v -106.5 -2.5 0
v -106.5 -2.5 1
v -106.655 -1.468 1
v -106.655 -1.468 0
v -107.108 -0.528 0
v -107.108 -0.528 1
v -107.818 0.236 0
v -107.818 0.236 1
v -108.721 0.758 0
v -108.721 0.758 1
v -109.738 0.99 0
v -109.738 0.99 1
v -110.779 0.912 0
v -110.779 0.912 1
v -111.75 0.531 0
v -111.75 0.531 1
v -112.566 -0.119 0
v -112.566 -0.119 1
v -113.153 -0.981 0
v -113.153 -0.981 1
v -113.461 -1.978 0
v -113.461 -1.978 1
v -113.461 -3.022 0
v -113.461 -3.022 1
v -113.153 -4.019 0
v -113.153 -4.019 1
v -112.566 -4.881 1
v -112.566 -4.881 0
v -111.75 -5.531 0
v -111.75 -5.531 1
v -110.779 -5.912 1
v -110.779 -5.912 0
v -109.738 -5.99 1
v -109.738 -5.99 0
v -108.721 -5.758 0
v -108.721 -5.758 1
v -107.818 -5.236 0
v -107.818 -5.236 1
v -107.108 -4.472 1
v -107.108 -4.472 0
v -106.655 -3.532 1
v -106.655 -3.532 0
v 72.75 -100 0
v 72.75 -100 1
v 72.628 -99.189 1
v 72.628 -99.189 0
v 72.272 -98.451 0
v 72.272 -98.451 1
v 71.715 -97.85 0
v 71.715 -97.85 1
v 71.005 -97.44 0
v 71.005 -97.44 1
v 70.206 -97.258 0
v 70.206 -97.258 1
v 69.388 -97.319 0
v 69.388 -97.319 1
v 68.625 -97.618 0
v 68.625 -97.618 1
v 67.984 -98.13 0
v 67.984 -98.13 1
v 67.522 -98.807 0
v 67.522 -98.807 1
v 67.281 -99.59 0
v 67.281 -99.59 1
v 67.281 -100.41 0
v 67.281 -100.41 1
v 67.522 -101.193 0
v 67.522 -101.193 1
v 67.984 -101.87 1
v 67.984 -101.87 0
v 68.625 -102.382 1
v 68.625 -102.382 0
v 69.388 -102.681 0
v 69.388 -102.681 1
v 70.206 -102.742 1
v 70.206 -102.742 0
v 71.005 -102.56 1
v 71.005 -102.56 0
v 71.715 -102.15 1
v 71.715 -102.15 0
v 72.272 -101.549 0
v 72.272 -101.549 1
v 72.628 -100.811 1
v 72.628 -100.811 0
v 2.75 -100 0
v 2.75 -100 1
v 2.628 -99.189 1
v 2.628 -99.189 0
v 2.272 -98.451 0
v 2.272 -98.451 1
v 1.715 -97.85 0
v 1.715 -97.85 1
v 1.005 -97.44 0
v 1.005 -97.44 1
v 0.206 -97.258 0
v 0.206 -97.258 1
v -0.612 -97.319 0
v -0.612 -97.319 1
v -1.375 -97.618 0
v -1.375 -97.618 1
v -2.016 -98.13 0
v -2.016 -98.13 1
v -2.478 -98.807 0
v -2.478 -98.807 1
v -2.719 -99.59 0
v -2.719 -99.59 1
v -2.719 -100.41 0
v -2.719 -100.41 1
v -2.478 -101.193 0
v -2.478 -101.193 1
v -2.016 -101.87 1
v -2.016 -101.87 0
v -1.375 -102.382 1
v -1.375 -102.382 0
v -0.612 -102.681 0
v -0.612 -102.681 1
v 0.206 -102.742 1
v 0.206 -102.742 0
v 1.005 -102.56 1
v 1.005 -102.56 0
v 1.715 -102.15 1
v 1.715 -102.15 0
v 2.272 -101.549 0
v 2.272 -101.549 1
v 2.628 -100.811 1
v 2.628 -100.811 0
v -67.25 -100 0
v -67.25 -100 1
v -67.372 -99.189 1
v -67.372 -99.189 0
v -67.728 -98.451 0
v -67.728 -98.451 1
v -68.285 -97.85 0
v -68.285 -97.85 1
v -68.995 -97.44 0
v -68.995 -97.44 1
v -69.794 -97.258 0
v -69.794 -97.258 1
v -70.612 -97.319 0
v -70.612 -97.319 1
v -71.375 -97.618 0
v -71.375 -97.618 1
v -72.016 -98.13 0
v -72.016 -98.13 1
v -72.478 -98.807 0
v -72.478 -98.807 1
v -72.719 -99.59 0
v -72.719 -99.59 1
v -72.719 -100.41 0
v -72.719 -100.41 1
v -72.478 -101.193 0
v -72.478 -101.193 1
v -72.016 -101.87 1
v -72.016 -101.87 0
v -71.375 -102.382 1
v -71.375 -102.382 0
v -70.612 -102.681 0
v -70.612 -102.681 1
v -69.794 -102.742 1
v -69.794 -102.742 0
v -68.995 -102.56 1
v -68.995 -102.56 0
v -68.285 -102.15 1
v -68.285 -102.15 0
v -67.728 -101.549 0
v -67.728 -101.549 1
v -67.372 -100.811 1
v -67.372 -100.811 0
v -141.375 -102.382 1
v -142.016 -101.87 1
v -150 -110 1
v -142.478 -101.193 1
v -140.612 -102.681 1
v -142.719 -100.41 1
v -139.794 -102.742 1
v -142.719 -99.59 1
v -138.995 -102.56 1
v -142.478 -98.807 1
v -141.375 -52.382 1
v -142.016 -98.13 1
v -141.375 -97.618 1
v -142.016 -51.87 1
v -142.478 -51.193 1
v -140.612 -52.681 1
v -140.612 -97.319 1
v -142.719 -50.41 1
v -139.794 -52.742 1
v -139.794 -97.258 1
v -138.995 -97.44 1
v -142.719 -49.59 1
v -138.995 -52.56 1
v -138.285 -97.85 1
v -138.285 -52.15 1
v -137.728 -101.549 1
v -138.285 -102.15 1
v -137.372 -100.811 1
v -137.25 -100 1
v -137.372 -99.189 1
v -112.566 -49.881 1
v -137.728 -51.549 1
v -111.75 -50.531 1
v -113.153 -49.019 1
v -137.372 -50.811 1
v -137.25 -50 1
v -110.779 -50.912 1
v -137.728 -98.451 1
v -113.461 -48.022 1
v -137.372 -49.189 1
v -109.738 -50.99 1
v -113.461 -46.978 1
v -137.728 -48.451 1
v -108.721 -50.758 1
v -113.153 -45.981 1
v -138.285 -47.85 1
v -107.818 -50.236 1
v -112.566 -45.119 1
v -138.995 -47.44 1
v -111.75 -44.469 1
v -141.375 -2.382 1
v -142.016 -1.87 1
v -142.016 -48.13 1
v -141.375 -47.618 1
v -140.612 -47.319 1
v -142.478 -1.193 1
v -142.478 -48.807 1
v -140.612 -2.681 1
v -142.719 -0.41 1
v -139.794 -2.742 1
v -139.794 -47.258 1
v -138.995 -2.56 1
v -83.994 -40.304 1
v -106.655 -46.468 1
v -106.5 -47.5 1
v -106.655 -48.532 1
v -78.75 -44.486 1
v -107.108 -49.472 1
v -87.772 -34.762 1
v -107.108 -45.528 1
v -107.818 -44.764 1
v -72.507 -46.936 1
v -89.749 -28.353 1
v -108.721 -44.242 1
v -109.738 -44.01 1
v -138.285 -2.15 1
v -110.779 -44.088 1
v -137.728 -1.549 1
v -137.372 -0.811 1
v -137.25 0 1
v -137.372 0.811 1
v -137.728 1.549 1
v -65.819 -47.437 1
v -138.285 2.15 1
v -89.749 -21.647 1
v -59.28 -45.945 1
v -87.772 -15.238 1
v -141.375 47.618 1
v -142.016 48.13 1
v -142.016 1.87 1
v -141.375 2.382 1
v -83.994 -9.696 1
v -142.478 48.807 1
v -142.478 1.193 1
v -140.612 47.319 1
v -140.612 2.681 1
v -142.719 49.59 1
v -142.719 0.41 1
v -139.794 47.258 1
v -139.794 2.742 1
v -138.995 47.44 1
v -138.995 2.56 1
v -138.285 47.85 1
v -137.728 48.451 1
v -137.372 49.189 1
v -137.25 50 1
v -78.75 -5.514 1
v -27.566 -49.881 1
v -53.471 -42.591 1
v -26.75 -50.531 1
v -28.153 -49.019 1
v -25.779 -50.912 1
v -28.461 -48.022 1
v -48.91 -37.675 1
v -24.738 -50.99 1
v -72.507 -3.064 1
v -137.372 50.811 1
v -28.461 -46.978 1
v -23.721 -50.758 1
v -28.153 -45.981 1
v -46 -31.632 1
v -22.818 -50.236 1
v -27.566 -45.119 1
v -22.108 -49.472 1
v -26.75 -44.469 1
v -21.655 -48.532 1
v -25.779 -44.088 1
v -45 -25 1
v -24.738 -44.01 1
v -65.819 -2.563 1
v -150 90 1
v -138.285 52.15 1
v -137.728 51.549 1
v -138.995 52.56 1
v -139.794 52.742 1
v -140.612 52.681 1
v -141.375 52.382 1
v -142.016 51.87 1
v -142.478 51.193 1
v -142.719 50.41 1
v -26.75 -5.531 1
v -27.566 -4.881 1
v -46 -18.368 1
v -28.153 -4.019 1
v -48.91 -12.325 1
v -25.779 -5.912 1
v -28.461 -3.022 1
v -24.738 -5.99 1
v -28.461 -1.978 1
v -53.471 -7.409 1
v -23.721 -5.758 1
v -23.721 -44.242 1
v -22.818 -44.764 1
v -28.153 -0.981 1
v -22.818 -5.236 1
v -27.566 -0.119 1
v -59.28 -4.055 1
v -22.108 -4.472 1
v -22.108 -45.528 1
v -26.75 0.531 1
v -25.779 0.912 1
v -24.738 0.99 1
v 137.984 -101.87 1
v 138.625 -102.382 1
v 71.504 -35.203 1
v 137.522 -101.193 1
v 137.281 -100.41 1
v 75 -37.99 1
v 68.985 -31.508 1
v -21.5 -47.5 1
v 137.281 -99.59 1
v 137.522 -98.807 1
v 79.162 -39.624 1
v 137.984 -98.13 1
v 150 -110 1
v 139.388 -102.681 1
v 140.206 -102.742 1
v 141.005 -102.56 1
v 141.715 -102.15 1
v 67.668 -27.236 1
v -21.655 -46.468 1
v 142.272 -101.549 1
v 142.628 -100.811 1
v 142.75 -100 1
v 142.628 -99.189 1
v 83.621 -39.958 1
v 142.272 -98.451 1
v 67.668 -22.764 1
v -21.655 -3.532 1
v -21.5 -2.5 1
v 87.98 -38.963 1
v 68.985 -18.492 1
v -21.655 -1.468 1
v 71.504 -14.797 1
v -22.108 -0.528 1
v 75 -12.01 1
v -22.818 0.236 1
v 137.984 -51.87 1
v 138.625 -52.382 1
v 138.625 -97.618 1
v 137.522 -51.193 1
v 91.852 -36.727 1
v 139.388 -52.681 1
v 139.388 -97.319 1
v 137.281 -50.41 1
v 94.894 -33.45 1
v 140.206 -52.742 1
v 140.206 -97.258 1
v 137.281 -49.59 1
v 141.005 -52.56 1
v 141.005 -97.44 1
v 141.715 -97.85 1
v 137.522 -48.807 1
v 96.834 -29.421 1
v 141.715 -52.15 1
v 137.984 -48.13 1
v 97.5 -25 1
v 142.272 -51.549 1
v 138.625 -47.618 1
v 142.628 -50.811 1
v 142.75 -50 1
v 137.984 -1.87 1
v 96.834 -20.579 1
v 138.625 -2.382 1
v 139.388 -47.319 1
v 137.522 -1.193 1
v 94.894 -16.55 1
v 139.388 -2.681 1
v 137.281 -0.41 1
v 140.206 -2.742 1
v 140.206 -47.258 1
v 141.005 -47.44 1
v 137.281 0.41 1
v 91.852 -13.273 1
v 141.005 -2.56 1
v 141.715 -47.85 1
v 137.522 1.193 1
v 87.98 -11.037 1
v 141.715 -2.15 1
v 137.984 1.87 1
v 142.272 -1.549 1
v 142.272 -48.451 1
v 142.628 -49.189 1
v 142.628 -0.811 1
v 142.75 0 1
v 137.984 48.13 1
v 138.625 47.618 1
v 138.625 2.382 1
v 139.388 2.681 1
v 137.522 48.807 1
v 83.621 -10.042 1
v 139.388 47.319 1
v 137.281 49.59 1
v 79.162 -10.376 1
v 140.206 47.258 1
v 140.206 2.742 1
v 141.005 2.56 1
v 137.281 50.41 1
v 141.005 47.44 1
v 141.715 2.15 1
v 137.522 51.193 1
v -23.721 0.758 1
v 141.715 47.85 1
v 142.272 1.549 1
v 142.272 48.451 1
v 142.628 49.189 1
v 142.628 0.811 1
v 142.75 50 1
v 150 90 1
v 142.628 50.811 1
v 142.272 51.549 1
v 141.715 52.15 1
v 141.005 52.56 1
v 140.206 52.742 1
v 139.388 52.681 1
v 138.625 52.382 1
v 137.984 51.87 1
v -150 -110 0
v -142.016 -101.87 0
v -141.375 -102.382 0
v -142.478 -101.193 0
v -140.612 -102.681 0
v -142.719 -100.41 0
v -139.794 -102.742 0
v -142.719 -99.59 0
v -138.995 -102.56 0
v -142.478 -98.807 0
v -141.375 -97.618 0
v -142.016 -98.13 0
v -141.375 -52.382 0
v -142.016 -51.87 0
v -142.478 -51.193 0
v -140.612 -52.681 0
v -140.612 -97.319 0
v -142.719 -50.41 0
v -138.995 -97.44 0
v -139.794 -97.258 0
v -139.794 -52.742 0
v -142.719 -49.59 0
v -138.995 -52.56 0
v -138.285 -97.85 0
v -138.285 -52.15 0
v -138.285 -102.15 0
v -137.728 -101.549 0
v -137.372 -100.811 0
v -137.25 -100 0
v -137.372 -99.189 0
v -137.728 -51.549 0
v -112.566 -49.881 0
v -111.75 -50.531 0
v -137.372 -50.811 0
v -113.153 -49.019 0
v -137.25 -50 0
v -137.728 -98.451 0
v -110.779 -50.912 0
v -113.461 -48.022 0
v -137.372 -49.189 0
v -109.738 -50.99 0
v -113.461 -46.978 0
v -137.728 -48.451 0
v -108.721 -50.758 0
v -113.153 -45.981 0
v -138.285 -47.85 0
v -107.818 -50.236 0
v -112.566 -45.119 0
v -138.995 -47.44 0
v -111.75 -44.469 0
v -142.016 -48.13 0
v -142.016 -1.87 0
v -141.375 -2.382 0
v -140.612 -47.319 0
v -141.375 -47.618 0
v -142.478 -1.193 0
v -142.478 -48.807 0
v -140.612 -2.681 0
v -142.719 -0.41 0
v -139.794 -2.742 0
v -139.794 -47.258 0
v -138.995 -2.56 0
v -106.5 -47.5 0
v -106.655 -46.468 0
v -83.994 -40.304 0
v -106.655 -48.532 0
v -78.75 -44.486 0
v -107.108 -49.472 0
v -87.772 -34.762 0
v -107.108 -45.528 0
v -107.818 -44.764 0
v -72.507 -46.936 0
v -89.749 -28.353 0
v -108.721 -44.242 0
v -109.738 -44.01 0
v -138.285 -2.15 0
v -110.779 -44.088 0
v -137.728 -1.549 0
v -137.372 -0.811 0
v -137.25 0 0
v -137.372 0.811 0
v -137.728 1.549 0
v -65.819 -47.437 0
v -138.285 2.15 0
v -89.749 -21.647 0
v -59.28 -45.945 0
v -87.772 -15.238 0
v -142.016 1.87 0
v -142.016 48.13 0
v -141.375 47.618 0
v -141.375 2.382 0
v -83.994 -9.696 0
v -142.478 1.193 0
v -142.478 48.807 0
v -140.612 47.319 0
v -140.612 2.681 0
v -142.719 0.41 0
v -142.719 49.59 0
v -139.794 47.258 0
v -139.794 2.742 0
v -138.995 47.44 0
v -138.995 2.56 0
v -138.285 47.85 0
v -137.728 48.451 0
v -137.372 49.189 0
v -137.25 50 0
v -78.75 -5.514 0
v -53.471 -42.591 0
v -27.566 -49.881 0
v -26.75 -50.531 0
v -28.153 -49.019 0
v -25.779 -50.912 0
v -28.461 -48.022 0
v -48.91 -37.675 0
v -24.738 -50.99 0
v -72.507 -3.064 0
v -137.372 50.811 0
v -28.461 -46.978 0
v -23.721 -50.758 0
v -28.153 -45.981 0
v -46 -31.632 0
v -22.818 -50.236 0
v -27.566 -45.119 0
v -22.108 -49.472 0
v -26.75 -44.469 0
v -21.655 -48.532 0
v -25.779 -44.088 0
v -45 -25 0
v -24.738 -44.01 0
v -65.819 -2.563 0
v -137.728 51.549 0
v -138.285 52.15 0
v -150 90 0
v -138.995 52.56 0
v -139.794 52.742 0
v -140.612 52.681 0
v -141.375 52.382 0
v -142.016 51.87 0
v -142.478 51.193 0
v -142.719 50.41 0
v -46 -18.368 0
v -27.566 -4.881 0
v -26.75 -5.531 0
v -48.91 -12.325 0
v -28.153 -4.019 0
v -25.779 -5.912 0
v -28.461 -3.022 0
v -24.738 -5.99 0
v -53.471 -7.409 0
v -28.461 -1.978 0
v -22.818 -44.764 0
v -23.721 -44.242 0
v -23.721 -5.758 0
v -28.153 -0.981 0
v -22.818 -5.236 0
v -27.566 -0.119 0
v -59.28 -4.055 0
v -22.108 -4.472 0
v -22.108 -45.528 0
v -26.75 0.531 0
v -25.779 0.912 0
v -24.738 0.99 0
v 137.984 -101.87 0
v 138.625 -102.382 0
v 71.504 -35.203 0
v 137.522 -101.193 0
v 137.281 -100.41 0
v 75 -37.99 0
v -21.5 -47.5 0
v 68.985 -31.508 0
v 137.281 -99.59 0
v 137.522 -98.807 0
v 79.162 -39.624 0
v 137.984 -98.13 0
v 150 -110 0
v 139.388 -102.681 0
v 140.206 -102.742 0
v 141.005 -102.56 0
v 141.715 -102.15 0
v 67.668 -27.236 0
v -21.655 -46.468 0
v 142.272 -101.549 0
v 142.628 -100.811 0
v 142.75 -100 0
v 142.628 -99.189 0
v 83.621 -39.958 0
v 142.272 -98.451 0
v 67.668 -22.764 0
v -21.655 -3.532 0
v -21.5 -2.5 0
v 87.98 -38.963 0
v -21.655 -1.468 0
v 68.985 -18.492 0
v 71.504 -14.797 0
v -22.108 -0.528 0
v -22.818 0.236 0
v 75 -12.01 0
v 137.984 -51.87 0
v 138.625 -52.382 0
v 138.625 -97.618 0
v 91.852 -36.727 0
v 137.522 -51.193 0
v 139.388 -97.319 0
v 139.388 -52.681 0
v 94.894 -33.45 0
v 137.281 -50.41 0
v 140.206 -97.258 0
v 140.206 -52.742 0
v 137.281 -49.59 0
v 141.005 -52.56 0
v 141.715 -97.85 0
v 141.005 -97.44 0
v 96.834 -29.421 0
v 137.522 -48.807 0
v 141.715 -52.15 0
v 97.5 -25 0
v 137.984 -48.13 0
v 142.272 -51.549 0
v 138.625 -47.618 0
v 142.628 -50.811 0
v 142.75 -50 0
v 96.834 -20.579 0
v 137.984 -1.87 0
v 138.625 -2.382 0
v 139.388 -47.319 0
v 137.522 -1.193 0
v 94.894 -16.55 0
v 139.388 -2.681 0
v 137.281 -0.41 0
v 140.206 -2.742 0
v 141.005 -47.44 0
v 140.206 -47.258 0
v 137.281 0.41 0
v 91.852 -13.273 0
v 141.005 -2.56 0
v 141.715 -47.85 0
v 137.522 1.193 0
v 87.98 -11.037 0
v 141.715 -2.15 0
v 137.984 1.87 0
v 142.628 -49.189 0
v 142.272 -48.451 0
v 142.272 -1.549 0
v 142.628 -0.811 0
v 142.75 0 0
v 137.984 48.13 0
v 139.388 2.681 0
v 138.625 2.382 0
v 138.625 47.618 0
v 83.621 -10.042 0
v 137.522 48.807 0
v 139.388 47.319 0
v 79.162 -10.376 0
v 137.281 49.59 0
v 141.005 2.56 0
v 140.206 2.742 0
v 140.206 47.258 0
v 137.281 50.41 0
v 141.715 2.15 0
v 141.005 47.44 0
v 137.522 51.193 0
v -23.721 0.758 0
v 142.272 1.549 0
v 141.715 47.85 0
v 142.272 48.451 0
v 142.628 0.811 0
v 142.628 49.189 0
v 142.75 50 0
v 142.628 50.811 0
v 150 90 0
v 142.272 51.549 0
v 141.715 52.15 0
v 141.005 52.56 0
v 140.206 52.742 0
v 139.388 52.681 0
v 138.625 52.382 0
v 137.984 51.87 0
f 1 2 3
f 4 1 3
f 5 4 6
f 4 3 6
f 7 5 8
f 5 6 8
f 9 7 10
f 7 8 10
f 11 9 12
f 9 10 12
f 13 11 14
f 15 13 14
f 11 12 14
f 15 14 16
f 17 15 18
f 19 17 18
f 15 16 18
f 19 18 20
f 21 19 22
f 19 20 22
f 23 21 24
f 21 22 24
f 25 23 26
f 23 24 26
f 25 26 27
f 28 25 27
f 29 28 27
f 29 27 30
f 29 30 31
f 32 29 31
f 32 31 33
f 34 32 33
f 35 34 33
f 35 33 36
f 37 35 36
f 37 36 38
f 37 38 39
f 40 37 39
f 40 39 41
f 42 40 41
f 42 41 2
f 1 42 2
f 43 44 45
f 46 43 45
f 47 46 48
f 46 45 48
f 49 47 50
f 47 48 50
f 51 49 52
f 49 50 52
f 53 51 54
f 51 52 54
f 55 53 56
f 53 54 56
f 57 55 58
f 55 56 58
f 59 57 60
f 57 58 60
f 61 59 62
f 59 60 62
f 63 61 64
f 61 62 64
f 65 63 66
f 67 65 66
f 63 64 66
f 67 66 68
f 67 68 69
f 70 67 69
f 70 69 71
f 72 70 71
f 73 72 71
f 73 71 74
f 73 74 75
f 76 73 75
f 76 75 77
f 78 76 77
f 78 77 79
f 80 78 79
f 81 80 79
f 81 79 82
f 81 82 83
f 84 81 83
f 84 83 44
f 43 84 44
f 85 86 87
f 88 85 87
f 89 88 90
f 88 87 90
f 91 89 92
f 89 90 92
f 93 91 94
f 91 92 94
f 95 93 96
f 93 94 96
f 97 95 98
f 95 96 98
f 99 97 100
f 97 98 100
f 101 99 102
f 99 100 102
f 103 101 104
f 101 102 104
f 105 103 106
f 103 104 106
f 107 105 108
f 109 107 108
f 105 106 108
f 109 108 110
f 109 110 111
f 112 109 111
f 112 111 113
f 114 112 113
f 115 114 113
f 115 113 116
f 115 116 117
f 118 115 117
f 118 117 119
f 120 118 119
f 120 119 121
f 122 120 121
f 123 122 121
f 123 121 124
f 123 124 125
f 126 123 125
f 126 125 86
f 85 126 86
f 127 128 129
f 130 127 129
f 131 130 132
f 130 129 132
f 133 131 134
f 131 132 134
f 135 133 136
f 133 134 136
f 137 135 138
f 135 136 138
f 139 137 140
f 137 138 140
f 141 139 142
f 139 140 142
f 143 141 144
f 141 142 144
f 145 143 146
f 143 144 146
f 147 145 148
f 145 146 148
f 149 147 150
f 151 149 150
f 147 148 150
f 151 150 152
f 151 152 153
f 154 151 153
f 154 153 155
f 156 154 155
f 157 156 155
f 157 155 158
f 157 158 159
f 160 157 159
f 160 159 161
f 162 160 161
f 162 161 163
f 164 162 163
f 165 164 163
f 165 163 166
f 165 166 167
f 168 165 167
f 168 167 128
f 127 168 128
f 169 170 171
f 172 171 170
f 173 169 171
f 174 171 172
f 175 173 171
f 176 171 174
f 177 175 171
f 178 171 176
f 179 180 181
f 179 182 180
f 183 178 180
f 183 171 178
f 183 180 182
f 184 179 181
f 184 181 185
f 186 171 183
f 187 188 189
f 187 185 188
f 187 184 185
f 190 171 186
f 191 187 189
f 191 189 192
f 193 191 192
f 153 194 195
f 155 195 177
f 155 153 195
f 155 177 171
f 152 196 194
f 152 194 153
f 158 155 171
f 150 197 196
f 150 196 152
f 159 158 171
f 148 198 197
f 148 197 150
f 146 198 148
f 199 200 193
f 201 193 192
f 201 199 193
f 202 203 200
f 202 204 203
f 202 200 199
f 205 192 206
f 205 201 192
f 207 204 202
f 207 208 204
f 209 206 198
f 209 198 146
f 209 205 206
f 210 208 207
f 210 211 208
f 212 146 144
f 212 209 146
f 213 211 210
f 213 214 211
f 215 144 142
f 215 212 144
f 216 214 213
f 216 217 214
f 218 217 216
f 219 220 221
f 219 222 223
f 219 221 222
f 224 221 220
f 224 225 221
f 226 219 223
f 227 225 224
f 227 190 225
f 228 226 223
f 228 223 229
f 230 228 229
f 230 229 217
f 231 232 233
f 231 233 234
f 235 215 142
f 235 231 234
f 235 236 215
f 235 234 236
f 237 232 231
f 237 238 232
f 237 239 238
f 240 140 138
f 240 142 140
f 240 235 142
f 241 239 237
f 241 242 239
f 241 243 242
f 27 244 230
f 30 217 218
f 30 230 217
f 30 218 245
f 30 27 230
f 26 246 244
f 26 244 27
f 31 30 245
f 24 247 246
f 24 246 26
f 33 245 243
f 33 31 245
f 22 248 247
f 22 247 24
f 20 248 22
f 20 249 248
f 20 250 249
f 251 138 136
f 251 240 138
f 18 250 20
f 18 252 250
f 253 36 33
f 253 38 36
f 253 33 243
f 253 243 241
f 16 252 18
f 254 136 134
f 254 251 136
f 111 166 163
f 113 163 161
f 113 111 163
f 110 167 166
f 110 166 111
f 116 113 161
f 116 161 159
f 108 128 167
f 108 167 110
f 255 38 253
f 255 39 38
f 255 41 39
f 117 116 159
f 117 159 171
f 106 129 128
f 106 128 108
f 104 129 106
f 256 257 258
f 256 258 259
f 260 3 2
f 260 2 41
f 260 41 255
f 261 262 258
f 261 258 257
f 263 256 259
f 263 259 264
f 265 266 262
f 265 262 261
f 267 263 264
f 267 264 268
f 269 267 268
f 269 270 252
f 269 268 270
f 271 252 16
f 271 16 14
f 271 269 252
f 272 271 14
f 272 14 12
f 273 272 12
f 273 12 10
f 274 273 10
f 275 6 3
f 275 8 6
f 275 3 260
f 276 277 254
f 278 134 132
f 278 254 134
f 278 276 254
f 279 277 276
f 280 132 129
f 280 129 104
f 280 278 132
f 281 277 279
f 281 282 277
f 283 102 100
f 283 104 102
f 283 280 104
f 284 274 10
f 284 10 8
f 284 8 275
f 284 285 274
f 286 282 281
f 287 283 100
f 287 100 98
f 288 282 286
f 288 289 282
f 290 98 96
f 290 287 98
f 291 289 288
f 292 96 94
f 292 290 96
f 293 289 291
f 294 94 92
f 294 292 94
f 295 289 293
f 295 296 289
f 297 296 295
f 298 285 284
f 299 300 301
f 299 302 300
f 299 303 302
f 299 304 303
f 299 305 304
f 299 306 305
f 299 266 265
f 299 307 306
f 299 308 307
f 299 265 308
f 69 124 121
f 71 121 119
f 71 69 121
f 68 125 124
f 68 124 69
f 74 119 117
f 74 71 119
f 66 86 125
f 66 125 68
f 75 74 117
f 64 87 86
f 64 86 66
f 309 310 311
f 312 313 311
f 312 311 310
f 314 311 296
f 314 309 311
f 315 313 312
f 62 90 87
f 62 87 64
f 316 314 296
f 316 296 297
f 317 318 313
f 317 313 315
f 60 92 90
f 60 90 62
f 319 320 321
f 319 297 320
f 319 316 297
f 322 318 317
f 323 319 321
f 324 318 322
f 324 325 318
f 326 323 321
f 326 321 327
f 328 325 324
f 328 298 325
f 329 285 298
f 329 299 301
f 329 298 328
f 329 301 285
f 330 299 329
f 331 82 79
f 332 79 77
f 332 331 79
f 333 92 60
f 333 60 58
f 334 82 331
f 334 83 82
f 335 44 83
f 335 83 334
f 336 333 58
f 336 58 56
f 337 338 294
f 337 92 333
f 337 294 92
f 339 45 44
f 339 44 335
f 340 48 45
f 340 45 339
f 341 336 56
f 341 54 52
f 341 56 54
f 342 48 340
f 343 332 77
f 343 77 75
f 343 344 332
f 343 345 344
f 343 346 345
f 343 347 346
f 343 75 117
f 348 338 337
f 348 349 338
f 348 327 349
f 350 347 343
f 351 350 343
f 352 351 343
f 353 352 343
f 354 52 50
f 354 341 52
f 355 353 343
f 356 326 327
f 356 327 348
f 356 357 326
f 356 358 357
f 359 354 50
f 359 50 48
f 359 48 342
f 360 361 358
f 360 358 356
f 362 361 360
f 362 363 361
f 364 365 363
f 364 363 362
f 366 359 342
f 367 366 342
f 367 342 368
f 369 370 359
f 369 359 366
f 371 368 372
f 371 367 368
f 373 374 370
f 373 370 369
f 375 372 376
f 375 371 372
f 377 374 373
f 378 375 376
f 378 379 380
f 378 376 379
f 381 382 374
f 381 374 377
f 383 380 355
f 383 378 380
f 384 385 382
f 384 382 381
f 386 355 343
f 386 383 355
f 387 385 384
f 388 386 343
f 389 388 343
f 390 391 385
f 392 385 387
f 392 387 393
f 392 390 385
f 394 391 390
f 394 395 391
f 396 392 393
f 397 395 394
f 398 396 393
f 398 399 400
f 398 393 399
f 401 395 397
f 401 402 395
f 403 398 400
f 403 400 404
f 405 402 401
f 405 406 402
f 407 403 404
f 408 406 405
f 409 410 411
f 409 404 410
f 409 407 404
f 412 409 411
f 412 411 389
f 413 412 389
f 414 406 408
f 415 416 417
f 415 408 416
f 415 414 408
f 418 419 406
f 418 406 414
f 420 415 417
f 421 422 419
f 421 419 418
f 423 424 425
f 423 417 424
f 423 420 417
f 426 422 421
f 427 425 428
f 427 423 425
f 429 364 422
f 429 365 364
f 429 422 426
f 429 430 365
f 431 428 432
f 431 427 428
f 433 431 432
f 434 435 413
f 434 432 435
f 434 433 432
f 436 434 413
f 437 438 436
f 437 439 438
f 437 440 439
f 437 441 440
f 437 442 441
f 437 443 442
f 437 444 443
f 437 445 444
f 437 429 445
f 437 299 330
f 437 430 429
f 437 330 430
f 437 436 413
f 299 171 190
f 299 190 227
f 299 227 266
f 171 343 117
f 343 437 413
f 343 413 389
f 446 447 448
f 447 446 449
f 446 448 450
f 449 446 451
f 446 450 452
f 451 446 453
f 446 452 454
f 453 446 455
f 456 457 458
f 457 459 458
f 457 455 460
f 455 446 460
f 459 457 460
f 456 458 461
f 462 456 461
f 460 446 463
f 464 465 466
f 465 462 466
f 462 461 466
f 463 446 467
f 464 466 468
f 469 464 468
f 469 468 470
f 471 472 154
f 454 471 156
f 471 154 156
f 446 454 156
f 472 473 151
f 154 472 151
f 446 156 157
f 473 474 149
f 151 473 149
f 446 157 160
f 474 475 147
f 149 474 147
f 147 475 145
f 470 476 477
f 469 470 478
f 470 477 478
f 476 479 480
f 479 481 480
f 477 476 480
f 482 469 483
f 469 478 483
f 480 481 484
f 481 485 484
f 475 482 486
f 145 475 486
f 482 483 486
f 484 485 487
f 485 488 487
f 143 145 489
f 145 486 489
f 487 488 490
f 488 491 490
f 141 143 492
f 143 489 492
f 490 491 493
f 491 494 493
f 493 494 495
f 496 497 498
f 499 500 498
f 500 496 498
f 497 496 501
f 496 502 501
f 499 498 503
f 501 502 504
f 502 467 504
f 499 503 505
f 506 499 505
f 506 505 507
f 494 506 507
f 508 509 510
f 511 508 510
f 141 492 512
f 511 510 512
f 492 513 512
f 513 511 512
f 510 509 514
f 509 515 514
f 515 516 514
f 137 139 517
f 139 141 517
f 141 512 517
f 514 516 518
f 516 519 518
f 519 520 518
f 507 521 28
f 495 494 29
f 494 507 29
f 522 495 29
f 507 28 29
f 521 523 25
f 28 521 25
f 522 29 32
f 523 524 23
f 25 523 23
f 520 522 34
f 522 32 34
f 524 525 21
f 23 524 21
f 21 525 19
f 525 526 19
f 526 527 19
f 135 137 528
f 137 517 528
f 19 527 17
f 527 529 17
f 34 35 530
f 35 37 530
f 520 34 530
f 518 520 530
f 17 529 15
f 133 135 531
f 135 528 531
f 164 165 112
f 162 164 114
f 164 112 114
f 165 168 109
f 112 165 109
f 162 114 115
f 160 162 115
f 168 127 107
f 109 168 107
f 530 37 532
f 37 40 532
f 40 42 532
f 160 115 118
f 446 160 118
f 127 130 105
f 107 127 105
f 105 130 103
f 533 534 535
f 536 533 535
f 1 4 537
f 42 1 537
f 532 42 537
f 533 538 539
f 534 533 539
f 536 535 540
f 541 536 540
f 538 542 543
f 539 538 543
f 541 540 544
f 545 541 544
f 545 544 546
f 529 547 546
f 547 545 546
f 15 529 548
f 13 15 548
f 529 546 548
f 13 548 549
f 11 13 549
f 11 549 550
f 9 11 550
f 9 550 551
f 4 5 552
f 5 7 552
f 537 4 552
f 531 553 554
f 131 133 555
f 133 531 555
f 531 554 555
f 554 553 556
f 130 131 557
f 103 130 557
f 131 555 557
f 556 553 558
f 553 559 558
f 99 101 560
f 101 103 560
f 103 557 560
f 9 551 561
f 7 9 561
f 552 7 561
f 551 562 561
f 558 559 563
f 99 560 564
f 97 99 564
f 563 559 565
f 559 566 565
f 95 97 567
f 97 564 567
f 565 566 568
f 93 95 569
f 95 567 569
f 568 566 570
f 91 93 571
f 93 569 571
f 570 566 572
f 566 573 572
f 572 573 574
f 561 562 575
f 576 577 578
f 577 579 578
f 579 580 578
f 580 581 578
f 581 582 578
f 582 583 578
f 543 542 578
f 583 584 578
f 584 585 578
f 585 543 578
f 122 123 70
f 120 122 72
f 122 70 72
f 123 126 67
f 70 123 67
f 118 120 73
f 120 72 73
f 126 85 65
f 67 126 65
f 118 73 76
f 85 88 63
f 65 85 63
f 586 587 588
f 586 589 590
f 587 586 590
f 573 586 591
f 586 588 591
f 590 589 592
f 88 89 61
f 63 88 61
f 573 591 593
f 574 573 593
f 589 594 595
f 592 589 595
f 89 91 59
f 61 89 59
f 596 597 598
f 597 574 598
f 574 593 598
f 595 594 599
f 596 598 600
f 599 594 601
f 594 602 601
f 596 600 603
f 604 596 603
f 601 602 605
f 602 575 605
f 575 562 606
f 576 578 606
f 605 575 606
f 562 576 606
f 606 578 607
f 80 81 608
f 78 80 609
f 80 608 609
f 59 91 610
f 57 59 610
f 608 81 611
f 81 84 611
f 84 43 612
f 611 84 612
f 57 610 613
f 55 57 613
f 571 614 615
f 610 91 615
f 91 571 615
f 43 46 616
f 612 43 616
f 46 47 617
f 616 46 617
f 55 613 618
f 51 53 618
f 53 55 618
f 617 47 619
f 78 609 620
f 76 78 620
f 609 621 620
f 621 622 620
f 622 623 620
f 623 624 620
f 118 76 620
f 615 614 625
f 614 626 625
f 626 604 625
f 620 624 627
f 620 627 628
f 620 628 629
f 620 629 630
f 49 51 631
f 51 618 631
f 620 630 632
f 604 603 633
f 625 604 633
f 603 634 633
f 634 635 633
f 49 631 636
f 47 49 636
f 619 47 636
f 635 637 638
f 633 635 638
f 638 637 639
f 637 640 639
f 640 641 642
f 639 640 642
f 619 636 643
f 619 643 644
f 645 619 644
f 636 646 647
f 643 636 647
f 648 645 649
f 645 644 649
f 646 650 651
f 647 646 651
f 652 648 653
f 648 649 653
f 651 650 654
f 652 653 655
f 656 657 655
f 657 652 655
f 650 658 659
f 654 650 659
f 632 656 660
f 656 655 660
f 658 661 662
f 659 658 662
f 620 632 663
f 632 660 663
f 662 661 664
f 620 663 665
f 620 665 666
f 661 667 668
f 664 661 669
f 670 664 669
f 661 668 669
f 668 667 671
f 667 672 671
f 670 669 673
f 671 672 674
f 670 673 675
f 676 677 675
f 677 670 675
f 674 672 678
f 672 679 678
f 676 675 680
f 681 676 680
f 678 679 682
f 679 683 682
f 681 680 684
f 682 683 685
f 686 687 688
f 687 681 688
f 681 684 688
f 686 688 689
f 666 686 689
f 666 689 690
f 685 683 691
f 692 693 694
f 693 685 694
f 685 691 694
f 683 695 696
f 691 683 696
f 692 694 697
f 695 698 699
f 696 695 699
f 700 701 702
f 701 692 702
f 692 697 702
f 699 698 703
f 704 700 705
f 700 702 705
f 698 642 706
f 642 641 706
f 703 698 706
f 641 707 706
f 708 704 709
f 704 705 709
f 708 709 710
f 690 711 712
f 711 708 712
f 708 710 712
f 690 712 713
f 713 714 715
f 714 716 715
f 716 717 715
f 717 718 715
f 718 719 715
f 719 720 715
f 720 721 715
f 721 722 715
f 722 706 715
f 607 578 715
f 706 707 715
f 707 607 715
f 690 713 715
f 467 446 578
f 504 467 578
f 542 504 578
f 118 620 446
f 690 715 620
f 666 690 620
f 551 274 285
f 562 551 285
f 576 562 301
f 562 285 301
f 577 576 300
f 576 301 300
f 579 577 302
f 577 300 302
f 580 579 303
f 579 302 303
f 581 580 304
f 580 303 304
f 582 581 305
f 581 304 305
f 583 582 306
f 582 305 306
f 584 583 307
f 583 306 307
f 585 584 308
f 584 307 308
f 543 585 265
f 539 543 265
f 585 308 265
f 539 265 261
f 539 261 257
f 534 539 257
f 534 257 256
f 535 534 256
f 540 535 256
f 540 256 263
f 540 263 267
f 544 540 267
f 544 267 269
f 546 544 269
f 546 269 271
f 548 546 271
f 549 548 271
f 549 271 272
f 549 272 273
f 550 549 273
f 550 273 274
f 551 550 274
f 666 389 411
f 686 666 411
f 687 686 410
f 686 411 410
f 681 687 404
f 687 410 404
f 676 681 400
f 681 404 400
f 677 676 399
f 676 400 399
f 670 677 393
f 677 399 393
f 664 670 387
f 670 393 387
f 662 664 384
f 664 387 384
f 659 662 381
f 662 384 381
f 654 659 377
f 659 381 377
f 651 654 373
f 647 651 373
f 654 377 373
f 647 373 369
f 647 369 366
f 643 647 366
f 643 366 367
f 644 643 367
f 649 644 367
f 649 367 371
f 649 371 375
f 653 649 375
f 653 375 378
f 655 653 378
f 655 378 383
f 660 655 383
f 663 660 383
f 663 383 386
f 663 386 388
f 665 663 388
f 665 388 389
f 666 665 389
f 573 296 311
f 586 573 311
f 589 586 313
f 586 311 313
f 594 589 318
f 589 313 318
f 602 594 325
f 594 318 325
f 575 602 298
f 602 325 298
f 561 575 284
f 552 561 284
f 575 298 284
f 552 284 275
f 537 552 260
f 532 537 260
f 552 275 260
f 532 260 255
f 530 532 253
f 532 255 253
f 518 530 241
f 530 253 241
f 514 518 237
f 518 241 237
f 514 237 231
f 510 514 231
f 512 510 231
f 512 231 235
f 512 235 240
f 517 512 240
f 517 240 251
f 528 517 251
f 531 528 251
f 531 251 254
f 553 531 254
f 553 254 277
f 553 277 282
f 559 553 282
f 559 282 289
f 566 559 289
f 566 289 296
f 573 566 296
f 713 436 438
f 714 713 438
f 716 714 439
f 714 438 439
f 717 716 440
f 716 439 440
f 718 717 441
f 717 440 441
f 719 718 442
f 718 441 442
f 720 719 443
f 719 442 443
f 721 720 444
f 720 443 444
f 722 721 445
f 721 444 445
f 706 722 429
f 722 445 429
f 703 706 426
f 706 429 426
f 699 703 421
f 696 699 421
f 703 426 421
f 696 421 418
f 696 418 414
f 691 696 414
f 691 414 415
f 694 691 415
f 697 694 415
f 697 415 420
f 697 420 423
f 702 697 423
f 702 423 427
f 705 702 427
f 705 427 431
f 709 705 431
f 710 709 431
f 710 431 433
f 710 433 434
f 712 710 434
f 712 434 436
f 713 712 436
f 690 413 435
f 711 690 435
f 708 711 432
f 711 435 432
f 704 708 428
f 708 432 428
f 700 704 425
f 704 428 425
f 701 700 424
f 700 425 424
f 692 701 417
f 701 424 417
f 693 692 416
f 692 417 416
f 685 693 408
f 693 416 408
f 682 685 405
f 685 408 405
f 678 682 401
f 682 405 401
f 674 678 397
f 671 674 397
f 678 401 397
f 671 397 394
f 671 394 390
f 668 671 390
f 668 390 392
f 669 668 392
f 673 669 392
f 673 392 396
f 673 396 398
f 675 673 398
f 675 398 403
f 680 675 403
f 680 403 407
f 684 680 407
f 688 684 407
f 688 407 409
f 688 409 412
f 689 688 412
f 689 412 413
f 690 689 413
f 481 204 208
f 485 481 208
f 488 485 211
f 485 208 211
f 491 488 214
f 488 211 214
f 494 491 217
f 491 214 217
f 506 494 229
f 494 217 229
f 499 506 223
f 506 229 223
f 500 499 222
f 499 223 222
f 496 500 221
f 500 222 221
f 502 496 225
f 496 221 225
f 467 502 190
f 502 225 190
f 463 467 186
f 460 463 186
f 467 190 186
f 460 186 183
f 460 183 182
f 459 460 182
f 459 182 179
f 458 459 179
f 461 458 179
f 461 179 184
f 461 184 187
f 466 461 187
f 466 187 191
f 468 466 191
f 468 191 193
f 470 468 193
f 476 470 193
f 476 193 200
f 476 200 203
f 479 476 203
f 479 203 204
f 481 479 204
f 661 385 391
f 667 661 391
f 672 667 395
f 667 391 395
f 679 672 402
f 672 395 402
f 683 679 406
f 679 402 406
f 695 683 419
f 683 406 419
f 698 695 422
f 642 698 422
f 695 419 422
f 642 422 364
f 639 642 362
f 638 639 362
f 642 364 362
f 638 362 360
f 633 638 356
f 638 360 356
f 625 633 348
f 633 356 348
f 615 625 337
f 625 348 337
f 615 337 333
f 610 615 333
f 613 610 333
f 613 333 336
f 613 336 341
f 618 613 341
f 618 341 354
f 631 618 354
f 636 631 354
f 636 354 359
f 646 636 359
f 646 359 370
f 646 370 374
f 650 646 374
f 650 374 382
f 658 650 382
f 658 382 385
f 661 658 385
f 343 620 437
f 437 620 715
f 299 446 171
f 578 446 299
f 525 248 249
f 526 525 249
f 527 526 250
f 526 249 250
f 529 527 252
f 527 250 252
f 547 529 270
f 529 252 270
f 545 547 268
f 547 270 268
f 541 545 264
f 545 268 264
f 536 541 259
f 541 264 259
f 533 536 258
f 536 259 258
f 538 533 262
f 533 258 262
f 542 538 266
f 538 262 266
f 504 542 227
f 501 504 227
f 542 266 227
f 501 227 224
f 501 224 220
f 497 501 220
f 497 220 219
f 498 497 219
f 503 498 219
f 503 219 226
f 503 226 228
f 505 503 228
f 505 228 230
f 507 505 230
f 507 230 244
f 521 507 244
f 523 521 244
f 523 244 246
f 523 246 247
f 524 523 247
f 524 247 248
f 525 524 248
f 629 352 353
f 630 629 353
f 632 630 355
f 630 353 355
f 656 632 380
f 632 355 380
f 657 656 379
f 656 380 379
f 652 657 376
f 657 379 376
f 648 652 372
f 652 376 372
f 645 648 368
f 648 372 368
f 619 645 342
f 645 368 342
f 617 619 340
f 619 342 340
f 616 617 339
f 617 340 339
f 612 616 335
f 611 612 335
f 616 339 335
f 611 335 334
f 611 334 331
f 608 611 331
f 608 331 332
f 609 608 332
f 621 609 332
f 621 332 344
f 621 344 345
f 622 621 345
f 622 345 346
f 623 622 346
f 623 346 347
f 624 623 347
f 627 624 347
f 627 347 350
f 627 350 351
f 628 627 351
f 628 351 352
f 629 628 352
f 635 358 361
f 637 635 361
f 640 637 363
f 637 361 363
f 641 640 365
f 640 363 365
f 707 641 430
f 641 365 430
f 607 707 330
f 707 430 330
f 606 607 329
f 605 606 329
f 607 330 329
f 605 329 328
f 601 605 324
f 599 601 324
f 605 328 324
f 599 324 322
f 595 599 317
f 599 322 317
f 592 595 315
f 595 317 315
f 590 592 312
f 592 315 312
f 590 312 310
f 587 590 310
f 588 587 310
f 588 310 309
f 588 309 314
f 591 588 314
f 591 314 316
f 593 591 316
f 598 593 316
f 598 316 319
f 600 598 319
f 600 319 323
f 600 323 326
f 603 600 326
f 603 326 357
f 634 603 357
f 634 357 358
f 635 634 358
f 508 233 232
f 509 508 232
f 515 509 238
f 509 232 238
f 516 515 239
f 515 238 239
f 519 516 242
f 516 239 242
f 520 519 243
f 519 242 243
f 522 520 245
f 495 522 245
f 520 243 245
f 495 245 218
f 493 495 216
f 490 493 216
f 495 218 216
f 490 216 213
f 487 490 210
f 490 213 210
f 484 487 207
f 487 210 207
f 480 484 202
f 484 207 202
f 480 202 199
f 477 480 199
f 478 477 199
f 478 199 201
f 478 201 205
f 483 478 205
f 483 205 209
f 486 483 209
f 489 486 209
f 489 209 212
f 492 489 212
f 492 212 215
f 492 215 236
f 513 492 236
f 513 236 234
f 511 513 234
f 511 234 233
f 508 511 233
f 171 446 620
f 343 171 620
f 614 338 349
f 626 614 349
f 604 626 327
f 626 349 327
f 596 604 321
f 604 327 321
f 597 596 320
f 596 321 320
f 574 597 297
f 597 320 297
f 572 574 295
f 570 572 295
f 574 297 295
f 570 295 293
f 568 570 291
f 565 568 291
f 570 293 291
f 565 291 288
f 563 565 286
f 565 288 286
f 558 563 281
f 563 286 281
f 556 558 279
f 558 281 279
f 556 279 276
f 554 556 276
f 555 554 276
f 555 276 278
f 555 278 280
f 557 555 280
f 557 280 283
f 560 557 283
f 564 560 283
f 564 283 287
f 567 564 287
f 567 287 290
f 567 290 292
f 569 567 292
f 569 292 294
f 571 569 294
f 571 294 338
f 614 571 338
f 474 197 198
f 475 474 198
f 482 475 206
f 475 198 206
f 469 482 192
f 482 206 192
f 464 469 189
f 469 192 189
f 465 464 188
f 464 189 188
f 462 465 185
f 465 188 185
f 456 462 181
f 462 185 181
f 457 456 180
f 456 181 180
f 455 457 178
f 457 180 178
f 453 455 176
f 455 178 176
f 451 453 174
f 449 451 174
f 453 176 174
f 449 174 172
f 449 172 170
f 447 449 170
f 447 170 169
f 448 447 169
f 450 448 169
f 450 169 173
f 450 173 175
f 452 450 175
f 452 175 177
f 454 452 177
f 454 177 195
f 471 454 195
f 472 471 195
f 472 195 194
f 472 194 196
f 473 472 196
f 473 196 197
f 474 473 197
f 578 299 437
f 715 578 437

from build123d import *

# Parameters (mm, degrees)
SKETCH_1_W          = 300
SKETCH_1_H          = 220
EXTRUDE_1_DEPTH     = 1
HOLE_WIZARD_M5_1_D  = 5.5
SKETCH_4_W          = 300
SKETCH_4_H          = 20
CUT_EXTRUDE_1_DEPTH = 10
SKETCH_5_R          = 22.5
SKETCH_5_R_2        = 15
SKETCH_5_R_3        = 3.5
CUT_EXTRUDE_2_DEPTH = 10


with BuildPart() as part:
    # 스케치1 → 보스-돌출1 (new body)
    with BuildSketch(Plane.XY):
        Rectangle(SKETCH_1_W, SKETCH_1_H)
    extrude(amount=EXTRUDE_1_DEPTH)

    # M5 여유 구멍1 (through all)
    with Locations(Plane(origin=(0, 0, 0), x_dir=(-1, 0, 0), z_dir=(0, 0, -1))):
        with Locations((-140, 100), (-70, 100), (70, 100), (0, 100), (140, 100), (140, 50), (140, -50), (140, 0), (140, -100), (-140, 50), (-140, -50), (-140, 0), (-140, -100), (-70, -100), (70, -100), (0, -100)):
            Hole(HOLE_WIZARD_M5_1_D / 2)

    # 스케치4 → 컷-돌출1 (cut)
    with BuildSketch(Plane.XY.offset(1)):
        with Locations((0, 100)):
            Rectangle(SKETCH_4_W, SKETCH_4_H)
    extrude(amount=-CUT_EXTRUDE_1_DEPTH, mode=Mode.SUBTRACT)

    # 스케치5 → 컷-돌출2 (cut)
    with BuildSketch(Plane.XY.offset(1)):
        with Locations((-67.5, -25)):
            Circle(SKETCH_5_R)
        with Locations((82.5, -25)):
            Circle(SKETCH_5_R_2)
        with Locations((-25, -47.5)):
            Circle(SKETCH_5_R_3)
        with Locations((-25, -2.5)):
            Circle(SKETCH_5_R_3)
        with Locations((-110, -47.5)):
            Circle(SKETCH_5_R_3)
        with Locations((-110, -2.5)):
            Circle(SKETCH_5_R_3)
    extrude(amount=-CUT_EXTRUDE_2_DEPTH, mode=Mode.SUBTRACT)


solid = part.part
